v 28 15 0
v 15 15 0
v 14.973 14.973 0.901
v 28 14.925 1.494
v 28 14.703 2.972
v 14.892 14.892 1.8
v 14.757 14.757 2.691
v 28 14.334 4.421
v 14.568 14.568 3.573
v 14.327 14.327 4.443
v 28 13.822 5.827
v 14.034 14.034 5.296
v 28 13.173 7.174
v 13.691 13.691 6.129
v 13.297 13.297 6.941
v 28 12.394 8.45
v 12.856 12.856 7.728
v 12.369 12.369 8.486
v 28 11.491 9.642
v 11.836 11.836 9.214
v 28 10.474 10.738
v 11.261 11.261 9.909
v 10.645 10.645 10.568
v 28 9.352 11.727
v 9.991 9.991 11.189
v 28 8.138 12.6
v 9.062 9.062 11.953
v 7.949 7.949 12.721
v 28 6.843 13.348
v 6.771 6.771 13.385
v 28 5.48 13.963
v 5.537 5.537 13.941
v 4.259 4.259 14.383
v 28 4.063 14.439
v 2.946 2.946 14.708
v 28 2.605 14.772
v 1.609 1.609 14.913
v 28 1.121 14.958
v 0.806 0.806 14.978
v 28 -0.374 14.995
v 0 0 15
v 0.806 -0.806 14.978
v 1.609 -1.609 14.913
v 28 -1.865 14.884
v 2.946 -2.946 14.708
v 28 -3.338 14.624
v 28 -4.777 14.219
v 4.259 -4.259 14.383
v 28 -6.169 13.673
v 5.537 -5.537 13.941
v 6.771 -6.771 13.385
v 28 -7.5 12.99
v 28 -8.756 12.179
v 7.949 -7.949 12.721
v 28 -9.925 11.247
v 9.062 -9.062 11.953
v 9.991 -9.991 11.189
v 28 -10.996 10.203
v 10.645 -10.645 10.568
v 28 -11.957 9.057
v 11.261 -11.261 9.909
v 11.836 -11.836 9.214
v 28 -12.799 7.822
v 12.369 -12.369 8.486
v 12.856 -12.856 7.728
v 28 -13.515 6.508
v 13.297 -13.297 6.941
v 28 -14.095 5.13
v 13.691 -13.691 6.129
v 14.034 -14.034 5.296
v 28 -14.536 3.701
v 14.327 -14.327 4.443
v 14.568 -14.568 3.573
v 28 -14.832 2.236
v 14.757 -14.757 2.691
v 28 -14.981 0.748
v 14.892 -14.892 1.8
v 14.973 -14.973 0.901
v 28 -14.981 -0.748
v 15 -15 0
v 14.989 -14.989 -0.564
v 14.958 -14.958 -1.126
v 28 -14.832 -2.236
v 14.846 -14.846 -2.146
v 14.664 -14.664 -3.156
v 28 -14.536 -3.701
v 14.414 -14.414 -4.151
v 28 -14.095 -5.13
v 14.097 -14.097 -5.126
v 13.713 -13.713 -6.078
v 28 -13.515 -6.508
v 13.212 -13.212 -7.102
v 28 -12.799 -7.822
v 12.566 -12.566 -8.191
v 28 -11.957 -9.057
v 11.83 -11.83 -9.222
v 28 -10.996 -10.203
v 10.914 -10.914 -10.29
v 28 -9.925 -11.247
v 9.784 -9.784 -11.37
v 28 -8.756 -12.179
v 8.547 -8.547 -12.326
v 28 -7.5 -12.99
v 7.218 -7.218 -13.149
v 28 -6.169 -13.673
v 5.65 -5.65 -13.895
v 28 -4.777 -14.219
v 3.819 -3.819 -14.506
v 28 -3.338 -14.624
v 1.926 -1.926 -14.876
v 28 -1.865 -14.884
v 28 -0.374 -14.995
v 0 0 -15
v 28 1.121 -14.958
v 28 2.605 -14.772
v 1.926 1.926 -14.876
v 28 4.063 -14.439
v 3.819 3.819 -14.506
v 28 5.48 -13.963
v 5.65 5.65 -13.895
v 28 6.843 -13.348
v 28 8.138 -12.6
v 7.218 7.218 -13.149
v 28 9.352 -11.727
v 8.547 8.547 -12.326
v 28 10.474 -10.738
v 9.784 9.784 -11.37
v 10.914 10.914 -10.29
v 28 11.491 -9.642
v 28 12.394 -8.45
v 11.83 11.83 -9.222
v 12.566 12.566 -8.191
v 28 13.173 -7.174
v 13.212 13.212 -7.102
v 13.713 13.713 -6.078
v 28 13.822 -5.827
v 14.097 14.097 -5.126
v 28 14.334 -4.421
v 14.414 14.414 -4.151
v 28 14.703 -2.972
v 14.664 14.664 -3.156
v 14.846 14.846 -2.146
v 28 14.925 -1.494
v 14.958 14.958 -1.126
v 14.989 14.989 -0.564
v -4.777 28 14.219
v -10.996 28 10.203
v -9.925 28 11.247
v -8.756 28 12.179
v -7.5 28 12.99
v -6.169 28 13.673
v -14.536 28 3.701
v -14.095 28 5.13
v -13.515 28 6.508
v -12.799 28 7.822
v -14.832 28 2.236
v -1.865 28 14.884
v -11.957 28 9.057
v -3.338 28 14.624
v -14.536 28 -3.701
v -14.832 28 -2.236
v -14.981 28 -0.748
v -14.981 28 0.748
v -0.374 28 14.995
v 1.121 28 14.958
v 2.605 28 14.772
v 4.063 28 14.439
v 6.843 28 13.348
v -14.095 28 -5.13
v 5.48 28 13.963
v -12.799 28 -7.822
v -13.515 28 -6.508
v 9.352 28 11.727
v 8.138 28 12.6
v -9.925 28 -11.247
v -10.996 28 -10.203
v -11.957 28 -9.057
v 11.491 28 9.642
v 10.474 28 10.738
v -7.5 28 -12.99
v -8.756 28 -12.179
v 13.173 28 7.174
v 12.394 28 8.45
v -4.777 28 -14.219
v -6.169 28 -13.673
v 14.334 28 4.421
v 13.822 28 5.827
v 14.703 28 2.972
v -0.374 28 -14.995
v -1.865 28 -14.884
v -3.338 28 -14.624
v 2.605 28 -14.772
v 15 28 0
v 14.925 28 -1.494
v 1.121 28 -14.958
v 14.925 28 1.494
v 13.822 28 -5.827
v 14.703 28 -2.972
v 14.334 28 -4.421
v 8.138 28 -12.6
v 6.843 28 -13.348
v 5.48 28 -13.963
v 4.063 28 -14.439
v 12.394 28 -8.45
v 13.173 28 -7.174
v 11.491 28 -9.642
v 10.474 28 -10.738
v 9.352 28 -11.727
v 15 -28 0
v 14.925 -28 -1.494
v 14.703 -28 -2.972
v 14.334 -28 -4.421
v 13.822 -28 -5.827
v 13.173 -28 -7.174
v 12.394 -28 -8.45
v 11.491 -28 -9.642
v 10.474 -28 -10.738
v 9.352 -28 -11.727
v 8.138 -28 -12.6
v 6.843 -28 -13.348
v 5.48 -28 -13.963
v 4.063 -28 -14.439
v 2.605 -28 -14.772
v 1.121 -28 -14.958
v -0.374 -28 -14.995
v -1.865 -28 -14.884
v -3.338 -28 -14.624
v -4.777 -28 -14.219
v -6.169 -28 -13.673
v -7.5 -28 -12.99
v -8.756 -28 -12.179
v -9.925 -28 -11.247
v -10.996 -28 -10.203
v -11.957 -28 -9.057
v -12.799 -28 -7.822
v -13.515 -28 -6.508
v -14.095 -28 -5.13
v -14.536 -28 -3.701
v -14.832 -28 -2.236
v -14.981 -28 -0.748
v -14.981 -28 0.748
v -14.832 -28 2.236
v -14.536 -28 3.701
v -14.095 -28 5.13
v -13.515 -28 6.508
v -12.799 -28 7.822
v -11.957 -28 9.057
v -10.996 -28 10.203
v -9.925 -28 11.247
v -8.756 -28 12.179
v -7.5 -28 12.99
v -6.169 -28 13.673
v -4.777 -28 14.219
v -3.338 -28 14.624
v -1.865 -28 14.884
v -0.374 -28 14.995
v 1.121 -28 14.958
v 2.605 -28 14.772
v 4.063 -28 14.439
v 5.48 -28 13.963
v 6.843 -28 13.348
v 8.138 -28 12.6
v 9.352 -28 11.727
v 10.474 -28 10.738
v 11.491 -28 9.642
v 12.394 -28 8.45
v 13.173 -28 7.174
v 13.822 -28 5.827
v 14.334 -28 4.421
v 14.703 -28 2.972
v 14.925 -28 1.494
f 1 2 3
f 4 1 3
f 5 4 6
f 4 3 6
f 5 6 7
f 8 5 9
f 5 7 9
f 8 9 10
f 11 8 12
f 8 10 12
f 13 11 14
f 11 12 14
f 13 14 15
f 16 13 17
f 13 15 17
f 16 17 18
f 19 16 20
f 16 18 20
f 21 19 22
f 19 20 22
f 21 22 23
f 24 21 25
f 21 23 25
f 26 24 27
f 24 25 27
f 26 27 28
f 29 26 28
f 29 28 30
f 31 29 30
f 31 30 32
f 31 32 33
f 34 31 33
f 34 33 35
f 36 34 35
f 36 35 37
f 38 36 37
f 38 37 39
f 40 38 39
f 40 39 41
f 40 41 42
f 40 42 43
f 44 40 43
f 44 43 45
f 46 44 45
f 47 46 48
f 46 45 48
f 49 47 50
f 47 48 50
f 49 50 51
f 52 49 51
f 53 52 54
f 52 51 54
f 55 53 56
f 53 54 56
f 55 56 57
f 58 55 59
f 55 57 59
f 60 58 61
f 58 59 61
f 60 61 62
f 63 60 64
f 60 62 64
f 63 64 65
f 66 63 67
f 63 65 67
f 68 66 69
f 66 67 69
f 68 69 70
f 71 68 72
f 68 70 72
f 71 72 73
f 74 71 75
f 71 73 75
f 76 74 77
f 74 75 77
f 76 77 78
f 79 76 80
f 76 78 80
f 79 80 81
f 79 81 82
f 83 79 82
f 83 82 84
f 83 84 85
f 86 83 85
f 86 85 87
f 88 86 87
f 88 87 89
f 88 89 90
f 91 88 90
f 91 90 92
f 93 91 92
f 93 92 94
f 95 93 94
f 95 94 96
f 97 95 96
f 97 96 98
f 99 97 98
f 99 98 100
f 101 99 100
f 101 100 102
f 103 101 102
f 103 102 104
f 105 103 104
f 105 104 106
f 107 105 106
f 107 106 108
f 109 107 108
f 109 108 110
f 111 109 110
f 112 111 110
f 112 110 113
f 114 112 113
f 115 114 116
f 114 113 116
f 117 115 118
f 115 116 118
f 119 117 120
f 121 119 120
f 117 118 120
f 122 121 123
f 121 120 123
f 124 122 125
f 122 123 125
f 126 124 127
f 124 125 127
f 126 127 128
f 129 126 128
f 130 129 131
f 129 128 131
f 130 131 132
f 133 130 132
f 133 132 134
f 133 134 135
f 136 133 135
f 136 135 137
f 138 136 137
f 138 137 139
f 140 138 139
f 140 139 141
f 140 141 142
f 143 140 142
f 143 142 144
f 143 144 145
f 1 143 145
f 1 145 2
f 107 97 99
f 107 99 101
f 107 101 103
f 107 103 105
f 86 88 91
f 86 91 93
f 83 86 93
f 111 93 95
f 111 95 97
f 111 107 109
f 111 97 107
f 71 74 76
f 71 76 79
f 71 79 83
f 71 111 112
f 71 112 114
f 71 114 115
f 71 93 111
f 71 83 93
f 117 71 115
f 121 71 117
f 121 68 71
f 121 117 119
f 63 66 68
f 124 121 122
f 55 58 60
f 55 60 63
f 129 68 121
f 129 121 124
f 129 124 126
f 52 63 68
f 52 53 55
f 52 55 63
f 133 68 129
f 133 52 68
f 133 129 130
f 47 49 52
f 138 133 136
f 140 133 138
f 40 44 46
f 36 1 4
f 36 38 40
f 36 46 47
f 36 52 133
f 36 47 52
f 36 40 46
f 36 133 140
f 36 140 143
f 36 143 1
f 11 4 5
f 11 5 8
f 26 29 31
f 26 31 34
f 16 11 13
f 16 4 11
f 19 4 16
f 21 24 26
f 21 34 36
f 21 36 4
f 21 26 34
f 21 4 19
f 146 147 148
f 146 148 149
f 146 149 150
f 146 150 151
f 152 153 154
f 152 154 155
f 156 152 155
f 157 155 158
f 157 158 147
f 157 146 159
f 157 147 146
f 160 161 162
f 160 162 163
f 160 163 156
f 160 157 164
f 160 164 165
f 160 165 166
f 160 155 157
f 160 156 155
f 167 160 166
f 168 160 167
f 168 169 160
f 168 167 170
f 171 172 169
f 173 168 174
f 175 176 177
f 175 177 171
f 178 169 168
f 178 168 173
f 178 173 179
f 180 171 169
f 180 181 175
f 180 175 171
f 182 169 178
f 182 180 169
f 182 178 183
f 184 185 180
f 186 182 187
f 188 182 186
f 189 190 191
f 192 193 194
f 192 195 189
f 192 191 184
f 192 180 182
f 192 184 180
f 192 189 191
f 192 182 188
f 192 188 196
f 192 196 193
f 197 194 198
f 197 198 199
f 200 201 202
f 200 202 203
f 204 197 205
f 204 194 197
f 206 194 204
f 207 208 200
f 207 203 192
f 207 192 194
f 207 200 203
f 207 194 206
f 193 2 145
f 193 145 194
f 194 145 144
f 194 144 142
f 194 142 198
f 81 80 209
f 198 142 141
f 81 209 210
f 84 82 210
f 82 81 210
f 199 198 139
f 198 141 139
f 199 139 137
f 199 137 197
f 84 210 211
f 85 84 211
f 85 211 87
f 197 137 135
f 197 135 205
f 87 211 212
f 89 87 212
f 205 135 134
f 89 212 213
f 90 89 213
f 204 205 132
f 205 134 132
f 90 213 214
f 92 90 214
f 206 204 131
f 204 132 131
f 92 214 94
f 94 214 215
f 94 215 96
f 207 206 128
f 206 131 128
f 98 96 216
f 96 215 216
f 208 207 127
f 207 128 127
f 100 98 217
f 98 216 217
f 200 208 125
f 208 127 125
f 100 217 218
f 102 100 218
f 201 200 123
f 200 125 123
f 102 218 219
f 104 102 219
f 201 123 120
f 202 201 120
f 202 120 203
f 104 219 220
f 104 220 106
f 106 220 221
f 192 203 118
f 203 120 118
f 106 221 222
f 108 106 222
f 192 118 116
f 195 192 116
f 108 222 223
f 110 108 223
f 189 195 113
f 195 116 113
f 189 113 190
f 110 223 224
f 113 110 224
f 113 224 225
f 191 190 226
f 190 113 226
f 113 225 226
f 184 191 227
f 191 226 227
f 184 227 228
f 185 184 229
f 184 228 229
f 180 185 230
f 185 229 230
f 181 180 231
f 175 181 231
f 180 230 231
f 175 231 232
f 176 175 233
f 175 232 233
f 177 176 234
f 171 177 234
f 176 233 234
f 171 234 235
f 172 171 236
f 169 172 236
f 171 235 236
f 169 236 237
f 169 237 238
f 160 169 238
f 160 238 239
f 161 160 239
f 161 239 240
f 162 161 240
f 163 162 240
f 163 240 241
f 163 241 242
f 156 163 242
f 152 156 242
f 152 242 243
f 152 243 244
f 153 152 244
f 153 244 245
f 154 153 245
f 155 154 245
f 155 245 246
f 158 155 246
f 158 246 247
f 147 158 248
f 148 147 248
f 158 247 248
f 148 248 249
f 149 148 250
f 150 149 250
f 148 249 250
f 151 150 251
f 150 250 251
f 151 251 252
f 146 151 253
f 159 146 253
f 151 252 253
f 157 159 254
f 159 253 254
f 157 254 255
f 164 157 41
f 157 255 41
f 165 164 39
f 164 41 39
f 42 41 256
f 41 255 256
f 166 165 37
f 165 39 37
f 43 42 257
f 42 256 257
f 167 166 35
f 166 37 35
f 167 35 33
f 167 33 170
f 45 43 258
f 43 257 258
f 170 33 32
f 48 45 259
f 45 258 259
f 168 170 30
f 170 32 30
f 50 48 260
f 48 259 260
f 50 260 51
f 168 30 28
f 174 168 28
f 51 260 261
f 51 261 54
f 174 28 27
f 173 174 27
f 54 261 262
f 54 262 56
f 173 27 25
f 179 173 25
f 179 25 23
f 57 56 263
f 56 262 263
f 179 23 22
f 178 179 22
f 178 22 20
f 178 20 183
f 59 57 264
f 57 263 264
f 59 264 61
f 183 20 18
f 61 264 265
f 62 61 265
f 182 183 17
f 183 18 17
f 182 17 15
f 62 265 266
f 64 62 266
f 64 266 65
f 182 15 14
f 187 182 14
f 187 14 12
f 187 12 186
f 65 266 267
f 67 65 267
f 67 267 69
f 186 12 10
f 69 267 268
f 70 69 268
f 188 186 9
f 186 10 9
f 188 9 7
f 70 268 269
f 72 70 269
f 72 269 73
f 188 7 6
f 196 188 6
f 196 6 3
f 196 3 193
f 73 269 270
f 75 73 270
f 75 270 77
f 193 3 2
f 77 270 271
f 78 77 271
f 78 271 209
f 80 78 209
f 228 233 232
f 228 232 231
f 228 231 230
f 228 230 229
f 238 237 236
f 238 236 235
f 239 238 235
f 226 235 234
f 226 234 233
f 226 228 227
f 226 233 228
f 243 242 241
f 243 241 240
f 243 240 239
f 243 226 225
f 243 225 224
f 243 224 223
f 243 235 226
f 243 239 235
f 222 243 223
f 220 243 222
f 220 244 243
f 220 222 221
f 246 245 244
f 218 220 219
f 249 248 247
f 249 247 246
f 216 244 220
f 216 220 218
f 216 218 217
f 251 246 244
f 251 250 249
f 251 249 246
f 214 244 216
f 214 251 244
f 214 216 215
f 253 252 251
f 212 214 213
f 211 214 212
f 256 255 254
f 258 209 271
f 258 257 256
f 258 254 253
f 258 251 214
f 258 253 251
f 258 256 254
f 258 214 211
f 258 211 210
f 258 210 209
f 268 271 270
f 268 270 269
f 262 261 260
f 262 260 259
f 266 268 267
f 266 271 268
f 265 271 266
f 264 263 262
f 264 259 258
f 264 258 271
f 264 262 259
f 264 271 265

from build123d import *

# Parameters (mm, degrees)
F0_R      = 15
F1_DEPTH  = 28
F1_FACE_R = 15
F2_DEPTH  = 28
F3_R      = 15
F4_DEPTH  = 28


with BuildPart() as f1:
    # F0 (on Front) → F1 (new body)
    with BuildSketch(Plane.XZ):
        Circle(F0_R)
    extrude(amount=F1_DEPTH)

    # F1_face (on face) → F2 (join)
    with BuildSketch(Plane(origin=(0, 0, 0), x_dir=(1, 0, 0), z_dir=(0, 1, 0))):
        Circle(F1_FACE_R)
    extrude(amount=F2_DEPTH)

    # F3 (on Right) → F4 (join)
    with BuildSketch(Plane.YZ):
        Circle(F3_R)
    extrude(amount=F4_DEPTH)


solid = f1.part
